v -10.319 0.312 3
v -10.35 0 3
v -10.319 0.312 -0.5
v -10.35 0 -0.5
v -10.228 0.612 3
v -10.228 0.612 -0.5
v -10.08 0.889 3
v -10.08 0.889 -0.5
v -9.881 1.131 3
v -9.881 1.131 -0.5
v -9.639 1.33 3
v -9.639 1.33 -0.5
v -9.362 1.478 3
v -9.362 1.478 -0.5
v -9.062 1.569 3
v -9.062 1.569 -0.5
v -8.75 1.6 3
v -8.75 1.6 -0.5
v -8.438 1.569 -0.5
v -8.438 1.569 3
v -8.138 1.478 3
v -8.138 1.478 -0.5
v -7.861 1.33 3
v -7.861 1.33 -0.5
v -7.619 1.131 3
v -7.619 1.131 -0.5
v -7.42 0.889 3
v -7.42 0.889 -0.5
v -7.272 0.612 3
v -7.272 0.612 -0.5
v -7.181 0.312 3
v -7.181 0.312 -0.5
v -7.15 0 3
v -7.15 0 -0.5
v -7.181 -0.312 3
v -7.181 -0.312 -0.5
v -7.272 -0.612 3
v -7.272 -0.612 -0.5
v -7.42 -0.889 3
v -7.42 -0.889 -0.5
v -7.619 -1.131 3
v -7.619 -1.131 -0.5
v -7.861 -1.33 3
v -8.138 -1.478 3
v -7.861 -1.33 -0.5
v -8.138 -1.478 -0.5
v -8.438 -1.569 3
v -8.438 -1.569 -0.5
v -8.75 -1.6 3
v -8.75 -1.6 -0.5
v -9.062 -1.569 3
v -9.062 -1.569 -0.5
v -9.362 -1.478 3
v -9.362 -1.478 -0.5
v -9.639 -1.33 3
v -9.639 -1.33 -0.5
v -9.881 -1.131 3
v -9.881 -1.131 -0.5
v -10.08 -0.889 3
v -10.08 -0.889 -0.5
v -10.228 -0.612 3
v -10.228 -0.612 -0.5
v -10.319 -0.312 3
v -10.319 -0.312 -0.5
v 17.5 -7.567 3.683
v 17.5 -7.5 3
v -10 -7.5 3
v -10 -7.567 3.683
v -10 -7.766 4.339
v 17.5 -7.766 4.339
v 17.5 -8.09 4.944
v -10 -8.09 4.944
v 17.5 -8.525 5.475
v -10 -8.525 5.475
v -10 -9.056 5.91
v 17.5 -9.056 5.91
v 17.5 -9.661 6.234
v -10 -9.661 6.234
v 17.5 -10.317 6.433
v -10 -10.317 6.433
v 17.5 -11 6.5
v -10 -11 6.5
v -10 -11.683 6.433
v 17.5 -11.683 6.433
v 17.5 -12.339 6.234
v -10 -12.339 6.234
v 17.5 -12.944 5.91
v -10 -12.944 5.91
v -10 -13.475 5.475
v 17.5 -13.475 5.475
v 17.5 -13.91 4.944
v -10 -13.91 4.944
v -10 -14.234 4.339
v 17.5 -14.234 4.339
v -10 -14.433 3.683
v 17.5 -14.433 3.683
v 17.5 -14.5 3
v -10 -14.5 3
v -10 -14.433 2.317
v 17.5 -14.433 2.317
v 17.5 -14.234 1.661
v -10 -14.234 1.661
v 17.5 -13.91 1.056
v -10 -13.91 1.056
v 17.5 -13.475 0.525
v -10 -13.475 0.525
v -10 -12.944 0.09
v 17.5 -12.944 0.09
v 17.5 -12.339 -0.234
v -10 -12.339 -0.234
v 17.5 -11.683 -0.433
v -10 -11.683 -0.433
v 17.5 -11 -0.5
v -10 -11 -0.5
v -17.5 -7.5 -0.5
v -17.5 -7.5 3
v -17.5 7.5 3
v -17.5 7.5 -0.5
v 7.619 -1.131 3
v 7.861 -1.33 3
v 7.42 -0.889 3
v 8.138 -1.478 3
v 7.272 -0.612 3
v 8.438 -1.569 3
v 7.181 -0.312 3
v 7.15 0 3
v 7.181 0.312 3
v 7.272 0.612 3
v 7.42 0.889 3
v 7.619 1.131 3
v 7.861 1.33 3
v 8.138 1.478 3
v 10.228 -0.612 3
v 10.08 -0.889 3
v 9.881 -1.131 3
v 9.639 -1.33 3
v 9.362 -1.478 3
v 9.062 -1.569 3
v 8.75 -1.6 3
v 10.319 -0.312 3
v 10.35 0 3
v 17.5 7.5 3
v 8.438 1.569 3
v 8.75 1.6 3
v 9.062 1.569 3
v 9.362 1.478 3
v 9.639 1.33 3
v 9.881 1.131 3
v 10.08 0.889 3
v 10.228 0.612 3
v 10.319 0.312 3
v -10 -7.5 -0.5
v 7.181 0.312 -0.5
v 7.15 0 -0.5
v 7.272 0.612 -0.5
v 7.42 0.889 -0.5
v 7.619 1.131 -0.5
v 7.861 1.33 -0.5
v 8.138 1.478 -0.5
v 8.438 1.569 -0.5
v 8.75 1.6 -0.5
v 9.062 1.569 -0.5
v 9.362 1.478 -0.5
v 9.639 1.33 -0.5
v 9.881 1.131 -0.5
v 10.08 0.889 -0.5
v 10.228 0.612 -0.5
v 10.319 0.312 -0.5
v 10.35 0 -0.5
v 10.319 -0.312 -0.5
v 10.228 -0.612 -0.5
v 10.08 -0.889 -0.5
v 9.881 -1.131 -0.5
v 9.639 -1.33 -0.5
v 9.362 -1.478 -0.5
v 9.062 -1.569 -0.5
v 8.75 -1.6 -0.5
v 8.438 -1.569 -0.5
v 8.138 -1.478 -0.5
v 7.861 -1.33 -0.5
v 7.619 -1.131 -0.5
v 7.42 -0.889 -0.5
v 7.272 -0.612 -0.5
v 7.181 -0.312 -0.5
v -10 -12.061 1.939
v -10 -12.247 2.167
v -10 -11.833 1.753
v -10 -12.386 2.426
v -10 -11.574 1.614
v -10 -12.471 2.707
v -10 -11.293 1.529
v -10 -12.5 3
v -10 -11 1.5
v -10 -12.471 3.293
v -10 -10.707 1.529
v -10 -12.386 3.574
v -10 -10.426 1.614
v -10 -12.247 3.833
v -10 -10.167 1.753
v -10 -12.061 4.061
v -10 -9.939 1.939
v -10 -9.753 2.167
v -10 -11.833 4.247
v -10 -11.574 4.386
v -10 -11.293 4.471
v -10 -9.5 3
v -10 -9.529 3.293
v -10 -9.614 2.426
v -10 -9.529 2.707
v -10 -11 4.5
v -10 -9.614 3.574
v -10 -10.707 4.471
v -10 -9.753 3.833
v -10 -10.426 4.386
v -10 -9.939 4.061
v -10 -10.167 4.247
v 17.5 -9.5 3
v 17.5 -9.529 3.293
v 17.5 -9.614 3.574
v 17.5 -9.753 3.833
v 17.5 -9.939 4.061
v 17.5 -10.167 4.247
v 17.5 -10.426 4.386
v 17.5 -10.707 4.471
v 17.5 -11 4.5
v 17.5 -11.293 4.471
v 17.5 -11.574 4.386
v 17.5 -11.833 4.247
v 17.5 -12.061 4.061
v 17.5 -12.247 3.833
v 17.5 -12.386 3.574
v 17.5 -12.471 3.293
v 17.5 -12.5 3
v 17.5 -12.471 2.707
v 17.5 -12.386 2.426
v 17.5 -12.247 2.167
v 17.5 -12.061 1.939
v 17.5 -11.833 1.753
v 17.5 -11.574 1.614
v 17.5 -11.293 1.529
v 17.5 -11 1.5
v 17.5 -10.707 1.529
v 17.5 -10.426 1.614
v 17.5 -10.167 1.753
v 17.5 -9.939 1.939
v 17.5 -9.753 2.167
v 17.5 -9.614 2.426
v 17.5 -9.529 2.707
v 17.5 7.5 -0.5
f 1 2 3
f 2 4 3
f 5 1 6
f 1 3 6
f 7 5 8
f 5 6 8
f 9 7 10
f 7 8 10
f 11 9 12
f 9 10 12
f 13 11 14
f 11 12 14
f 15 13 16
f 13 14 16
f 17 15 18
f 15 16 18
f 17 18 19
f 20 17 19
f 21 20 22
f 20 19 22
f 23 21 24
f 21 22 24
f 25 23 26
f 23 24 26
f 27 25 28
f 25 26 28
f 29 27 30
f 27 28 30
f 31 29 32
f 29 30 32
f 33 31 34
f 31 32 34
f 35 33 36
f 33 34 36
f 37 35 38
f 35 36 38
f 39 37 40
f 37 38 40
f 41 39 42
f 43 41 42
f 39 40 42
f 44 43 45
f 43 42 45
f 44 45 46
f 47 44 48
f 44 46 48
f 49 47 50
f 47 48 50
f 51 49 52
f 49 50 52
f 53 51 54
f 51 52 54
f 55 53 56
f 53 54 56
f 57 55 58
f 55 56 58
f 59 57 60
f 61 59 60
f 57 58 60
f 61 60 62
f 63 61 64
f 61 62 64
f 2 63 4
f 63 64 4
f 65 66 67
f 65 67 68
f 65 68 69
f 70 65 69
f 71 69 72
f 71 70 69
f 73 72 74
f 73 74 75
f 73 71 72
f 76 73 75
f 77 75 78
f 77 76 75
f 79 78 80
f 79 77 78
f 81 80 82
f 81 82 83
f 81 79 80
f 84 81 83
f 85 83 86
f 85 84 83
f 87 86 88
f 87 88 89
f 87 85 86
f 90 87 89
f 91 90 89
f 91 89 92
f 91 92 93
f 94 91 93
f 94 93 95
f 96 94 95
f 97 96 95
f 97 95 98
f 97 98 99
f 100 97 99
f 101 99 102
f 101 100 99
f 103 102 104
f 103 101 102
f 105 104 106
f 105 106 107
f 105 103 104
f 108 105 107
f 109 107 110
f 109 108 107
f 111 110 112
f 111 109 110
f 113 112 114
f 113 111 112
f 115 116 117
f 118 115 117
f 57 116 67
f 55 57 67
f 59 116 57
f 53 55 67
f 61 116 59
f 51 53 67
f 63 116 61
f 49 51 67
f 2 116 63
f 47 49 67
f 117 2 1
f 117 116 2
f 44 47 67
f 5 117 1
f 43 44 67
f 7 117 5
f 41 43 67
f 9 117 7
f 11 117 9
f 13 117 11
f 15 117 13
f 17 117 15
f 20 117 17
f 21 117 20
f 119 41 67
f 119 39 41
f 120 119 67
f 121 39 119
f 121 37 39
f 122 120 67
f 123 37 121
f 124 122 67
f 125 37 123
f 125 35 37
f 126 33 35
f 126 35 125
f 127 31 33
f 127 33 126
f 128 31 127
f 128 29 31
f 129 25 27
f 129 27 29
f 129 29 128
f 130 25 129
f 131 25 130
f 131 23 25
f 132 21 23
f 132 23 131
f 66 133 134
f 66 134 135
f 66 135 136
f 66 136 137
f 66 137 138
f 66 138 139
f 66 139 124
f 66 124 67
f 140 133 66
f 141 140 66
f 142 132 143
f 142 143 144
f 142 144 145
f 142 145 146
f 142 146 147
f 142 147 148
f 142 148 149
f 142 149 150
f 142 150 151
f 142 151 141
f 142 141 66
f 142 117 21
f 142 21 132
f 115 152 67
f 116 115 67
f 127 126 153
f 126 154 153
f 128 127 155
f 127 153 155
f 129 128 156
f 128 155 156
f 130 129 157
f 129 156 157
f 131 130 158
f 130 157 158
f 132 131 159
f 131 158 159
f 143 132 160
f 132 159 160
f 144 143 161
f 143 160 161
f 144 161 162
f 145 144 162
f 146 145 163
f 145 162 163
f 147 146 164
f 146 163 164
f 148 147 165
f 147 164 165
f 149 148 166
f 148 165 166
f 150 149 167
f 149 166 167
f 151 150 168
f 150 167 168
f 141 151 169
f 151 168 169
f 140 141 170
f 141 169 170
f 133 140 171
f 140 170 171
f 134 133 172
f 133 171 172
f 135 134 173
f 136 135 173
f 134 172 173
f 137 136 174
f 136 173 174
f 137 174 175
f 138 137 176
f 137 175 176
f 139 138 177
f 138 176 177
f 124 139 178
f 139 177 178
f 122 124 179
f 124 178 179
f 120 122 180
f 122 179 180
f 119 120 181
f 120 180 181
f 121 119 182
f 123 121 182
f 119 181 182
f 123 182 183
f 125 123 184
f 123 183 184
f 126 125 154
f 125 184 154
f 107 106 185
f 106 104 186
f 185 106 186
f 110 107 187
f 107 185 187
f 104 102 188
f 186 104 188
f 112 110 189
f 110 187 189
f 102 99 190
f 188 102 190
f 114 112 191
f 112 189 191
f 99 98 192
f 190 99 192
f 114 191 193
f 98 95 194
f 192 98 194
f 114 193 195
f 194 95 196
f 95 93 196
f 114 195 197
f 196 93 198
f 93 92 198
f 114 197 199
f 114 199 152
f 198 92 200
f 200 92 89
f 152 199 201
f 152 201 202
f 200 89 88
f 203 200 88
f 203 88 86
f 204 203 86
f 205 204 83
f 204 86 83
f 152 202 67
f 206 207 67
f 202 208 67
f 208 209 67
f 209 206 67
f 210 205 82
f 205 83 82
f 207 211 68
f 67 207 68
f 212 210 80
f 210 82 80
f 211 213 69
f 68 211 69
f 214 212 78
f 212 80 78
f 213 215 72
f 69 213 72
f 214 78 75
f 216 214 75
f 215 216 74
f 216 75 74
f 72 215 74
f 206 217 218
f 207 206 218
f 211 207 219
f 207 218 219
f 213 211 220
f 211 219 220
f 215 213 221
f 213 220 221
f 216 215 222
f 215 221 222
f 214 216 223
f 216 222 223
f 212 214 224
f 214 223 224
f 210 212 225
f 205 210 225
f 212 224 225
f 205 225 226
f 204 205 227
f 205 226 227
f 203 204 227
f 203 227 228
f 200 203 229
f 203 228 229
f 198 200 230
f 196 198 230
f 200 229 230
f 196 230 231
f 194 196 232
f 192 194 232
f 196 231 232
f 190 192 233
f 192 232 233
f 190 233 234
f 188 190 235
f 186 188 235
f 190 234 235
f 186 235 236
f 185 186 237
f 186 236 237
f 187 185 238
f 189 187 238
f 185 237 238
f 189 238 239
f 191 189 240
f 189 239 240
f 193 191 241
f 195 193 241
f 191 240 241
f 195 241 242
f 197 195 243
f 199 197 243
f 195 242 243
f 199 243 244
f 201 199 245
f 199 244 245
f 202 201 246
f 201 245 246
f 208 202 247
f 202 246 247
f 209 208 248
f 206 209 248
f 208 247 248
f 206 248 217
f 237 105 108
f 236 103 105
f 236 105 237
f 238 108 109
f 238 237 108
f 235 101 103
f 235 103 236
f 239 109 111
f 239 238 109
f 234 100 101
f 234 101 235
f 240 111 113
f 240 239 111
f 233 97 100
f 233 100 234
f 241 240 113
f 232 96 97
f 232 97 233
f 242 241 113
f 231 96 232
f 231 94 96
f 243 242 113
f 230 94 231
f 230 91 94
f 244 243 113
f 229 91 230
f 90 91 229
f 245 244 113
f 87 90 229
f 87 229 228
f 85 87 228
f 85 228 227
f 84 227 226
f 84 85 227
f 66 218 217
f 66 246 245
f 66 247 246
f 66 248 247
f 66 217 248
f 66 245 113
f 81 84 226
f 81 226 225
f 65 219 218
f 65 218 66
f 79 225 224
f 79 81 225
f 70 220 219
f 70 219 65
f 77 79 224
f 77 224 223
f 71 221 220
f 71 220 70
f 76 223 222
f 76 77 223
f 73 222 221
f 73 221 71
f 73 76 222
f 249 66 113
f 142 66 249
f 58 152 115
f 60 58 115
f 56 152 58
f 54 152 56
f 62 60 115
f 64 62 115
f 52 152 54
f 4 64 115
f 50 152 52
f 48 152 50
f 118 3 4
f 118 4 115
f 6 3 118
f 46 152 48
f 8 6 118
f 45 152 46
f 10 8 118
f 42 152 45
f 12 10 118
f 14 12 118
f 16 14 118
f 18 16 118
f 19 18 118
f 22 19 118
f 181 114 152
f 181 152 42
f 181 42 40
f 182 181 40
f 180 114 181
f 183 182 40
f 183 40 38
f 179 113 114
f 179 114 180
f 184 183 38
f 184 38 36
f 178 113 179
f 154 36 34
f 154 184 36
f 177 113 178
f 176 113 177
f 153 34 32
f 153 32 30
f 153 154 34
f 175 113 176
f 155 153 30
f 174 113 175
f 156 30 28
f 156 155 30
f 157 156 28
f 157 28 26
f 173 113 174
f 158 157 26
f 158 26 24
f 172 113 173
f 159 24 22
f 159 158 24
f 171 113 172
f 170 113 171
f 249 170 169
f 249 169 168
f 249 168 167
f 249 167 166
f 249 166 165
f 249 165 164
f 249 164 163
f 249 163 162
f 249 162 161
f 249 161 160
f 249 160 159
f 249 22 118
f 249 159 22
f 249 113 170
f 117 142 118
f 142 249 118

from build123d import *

# Parameters (mm, degrees)
F1_DEPTH = 3
F2_R     = 1.5
F2_W     = 15
F2_H     = 0.5
F3_DEPTH = 35
F4_DEPTH = 25
F5_DEPTH = 35
F6_DEPTH = 27.5


with BuildPart() as f1:
    # F0 (on Top) → F1 (new body)
    with BuildSketch(Plane.XY):
        with BuildLine():
            Line((-17.5, 0), (-17.5, -7.5))
            Line((-17.5, -7.5), (17.5, -7.5))
            Line((17.5, -7.5), (17.5, 0))
            Line((17.5, 0), (10.35, 0))
            ThreePointArc((10.35, 0), (8.75, -1.6), (7.15, 0))
            Line((7.15, 0), (0, 0))
            Line((0, 0), (-7.15, 0))
            ThreePointArc((-7.15, 0), (-8.75, -1.6), (-10.35, 0))
            Line((-10.35, 0), (-17.5, 0))
        make_face()
        with BuildLine():
            Line((-17.5, 7.5), (-17.5, 0))
            Line((-17.5, 0), (-10.35, 0))
            ThreePointArc((-10.35, 0), (-8.75, 1.6), (-7.15, 0))
            Line((-7.15, 0), (0, 0))
            Line((0, 0), (7.15, 0))
            ThreePointArc((7.15, 0), (8.75, 1.6), (10.35, 0))
            Line((10.35, 0), (17.5, 0))
            Line((17.5, 0), (17.5, 7.5))
            Line((17.5, 7.5), (-17.5, 7.5))
        make_face()
    extrude(amount=F1_DEPTH)

    # F2 (on face) → F3 (join)
    with BuildSketch(Plane.YZ.offset(17.5)):
        with BuildLine():
            ThreePointArc((-11, -0.5), (-8.5251262658, 0.5251262658), (-7.5, 3))
            ThreePointArc((-7.5, 3), (-13.4748737342, 5.4748737342), (-11, -0.5))
        make_face()
        with Locations((-11, 3)):
            Circle(F2_R, mode=Mode.SUBTRACT)
        with BuildLine():
            Line((-7.5, 0), (-7.5, 3))
            ThreePointArc((-7.5, 3), (-8.5251262658, 0.5251262658), (-11, -0.5))
            Line((-11, -0.5), (-7.5, -0.5))
            Line((-7.5, -0.5), (-7.5, 0))
        make_face()
        with Locations((0, -0.25)):
            Rectangle(F2_W, F2_H)
    extrude(amount=-F3_DEPTH)

    # F4 (cut): faces of the model
    f4_faces = [f1.faces().sort_by_distance(p)[0] for p in [
        (-8.75, 0, 0),
        (8.75, 0, 0),
    ]]
    extrude(f4_faces, amount=-F4_DEPTH, mode=Mode.SUBTRACT)

    # F2 (on face) → F5 (cut)
    with BuildSketch(Plane.YZ.offset(17.5)):
        with BuildLine():
            ThreePointArc((-11, -0.5), (-8.5251262658, 0.5251262658), (-7.5, 3))
            ThreePointArc((-7.5, 3), (-13.4748737342, 5.4748737342), (-11, -0.5))
        make_face()
        with Locations((-11, 3)):
            Circle(F2_R, mode=Mode.SUBTRACT)
        with BuildLine():
            Line((-7.5, 0), (-7.5, 3))
            ThreePointArc((-7.5, 3), (-8.5251262658, 0.5251262658), (-11, -0.5))
            Line((-11, -0.5), (-7.5, -0.5))
            Line((-7.5, -0.5), (-7.5, 0))
        make_face()
    extrude(amount=-F5_DEPTH, mode=Mode.SUBTRACT)

    # F2 (on face) → F6 (join)
    with BuildSketch(Plane.YZ.offset(17.5)):
        with BuildLine():
            ThreePointArc((-11, -0.5), (-8.5251262658, 0.5251262658), (-7.5, 3))
            ThreePointArc((-7.5, 3), (-13.4748737342, 5.4748737342), (-11, -0.5))
        make_face()
        with Locations((-11, 3)):
            Circle(F2_R, mode=Mode.SUBTRACT)
        with BuildLine():
            Line((-7.5, 0), (-7.5, 3))
            ThreePointArc((-7.5, 3), (-8.5251262658, 0.5251262658), (-11, -0.5))
            Line((-11, -0.5), (-7.5, -0.5))
            Line((-7.5, -0.5), (-7.5, 0))
        make_face()
    extrude(amount=-F6_DEPTH)


solid = f1.part
